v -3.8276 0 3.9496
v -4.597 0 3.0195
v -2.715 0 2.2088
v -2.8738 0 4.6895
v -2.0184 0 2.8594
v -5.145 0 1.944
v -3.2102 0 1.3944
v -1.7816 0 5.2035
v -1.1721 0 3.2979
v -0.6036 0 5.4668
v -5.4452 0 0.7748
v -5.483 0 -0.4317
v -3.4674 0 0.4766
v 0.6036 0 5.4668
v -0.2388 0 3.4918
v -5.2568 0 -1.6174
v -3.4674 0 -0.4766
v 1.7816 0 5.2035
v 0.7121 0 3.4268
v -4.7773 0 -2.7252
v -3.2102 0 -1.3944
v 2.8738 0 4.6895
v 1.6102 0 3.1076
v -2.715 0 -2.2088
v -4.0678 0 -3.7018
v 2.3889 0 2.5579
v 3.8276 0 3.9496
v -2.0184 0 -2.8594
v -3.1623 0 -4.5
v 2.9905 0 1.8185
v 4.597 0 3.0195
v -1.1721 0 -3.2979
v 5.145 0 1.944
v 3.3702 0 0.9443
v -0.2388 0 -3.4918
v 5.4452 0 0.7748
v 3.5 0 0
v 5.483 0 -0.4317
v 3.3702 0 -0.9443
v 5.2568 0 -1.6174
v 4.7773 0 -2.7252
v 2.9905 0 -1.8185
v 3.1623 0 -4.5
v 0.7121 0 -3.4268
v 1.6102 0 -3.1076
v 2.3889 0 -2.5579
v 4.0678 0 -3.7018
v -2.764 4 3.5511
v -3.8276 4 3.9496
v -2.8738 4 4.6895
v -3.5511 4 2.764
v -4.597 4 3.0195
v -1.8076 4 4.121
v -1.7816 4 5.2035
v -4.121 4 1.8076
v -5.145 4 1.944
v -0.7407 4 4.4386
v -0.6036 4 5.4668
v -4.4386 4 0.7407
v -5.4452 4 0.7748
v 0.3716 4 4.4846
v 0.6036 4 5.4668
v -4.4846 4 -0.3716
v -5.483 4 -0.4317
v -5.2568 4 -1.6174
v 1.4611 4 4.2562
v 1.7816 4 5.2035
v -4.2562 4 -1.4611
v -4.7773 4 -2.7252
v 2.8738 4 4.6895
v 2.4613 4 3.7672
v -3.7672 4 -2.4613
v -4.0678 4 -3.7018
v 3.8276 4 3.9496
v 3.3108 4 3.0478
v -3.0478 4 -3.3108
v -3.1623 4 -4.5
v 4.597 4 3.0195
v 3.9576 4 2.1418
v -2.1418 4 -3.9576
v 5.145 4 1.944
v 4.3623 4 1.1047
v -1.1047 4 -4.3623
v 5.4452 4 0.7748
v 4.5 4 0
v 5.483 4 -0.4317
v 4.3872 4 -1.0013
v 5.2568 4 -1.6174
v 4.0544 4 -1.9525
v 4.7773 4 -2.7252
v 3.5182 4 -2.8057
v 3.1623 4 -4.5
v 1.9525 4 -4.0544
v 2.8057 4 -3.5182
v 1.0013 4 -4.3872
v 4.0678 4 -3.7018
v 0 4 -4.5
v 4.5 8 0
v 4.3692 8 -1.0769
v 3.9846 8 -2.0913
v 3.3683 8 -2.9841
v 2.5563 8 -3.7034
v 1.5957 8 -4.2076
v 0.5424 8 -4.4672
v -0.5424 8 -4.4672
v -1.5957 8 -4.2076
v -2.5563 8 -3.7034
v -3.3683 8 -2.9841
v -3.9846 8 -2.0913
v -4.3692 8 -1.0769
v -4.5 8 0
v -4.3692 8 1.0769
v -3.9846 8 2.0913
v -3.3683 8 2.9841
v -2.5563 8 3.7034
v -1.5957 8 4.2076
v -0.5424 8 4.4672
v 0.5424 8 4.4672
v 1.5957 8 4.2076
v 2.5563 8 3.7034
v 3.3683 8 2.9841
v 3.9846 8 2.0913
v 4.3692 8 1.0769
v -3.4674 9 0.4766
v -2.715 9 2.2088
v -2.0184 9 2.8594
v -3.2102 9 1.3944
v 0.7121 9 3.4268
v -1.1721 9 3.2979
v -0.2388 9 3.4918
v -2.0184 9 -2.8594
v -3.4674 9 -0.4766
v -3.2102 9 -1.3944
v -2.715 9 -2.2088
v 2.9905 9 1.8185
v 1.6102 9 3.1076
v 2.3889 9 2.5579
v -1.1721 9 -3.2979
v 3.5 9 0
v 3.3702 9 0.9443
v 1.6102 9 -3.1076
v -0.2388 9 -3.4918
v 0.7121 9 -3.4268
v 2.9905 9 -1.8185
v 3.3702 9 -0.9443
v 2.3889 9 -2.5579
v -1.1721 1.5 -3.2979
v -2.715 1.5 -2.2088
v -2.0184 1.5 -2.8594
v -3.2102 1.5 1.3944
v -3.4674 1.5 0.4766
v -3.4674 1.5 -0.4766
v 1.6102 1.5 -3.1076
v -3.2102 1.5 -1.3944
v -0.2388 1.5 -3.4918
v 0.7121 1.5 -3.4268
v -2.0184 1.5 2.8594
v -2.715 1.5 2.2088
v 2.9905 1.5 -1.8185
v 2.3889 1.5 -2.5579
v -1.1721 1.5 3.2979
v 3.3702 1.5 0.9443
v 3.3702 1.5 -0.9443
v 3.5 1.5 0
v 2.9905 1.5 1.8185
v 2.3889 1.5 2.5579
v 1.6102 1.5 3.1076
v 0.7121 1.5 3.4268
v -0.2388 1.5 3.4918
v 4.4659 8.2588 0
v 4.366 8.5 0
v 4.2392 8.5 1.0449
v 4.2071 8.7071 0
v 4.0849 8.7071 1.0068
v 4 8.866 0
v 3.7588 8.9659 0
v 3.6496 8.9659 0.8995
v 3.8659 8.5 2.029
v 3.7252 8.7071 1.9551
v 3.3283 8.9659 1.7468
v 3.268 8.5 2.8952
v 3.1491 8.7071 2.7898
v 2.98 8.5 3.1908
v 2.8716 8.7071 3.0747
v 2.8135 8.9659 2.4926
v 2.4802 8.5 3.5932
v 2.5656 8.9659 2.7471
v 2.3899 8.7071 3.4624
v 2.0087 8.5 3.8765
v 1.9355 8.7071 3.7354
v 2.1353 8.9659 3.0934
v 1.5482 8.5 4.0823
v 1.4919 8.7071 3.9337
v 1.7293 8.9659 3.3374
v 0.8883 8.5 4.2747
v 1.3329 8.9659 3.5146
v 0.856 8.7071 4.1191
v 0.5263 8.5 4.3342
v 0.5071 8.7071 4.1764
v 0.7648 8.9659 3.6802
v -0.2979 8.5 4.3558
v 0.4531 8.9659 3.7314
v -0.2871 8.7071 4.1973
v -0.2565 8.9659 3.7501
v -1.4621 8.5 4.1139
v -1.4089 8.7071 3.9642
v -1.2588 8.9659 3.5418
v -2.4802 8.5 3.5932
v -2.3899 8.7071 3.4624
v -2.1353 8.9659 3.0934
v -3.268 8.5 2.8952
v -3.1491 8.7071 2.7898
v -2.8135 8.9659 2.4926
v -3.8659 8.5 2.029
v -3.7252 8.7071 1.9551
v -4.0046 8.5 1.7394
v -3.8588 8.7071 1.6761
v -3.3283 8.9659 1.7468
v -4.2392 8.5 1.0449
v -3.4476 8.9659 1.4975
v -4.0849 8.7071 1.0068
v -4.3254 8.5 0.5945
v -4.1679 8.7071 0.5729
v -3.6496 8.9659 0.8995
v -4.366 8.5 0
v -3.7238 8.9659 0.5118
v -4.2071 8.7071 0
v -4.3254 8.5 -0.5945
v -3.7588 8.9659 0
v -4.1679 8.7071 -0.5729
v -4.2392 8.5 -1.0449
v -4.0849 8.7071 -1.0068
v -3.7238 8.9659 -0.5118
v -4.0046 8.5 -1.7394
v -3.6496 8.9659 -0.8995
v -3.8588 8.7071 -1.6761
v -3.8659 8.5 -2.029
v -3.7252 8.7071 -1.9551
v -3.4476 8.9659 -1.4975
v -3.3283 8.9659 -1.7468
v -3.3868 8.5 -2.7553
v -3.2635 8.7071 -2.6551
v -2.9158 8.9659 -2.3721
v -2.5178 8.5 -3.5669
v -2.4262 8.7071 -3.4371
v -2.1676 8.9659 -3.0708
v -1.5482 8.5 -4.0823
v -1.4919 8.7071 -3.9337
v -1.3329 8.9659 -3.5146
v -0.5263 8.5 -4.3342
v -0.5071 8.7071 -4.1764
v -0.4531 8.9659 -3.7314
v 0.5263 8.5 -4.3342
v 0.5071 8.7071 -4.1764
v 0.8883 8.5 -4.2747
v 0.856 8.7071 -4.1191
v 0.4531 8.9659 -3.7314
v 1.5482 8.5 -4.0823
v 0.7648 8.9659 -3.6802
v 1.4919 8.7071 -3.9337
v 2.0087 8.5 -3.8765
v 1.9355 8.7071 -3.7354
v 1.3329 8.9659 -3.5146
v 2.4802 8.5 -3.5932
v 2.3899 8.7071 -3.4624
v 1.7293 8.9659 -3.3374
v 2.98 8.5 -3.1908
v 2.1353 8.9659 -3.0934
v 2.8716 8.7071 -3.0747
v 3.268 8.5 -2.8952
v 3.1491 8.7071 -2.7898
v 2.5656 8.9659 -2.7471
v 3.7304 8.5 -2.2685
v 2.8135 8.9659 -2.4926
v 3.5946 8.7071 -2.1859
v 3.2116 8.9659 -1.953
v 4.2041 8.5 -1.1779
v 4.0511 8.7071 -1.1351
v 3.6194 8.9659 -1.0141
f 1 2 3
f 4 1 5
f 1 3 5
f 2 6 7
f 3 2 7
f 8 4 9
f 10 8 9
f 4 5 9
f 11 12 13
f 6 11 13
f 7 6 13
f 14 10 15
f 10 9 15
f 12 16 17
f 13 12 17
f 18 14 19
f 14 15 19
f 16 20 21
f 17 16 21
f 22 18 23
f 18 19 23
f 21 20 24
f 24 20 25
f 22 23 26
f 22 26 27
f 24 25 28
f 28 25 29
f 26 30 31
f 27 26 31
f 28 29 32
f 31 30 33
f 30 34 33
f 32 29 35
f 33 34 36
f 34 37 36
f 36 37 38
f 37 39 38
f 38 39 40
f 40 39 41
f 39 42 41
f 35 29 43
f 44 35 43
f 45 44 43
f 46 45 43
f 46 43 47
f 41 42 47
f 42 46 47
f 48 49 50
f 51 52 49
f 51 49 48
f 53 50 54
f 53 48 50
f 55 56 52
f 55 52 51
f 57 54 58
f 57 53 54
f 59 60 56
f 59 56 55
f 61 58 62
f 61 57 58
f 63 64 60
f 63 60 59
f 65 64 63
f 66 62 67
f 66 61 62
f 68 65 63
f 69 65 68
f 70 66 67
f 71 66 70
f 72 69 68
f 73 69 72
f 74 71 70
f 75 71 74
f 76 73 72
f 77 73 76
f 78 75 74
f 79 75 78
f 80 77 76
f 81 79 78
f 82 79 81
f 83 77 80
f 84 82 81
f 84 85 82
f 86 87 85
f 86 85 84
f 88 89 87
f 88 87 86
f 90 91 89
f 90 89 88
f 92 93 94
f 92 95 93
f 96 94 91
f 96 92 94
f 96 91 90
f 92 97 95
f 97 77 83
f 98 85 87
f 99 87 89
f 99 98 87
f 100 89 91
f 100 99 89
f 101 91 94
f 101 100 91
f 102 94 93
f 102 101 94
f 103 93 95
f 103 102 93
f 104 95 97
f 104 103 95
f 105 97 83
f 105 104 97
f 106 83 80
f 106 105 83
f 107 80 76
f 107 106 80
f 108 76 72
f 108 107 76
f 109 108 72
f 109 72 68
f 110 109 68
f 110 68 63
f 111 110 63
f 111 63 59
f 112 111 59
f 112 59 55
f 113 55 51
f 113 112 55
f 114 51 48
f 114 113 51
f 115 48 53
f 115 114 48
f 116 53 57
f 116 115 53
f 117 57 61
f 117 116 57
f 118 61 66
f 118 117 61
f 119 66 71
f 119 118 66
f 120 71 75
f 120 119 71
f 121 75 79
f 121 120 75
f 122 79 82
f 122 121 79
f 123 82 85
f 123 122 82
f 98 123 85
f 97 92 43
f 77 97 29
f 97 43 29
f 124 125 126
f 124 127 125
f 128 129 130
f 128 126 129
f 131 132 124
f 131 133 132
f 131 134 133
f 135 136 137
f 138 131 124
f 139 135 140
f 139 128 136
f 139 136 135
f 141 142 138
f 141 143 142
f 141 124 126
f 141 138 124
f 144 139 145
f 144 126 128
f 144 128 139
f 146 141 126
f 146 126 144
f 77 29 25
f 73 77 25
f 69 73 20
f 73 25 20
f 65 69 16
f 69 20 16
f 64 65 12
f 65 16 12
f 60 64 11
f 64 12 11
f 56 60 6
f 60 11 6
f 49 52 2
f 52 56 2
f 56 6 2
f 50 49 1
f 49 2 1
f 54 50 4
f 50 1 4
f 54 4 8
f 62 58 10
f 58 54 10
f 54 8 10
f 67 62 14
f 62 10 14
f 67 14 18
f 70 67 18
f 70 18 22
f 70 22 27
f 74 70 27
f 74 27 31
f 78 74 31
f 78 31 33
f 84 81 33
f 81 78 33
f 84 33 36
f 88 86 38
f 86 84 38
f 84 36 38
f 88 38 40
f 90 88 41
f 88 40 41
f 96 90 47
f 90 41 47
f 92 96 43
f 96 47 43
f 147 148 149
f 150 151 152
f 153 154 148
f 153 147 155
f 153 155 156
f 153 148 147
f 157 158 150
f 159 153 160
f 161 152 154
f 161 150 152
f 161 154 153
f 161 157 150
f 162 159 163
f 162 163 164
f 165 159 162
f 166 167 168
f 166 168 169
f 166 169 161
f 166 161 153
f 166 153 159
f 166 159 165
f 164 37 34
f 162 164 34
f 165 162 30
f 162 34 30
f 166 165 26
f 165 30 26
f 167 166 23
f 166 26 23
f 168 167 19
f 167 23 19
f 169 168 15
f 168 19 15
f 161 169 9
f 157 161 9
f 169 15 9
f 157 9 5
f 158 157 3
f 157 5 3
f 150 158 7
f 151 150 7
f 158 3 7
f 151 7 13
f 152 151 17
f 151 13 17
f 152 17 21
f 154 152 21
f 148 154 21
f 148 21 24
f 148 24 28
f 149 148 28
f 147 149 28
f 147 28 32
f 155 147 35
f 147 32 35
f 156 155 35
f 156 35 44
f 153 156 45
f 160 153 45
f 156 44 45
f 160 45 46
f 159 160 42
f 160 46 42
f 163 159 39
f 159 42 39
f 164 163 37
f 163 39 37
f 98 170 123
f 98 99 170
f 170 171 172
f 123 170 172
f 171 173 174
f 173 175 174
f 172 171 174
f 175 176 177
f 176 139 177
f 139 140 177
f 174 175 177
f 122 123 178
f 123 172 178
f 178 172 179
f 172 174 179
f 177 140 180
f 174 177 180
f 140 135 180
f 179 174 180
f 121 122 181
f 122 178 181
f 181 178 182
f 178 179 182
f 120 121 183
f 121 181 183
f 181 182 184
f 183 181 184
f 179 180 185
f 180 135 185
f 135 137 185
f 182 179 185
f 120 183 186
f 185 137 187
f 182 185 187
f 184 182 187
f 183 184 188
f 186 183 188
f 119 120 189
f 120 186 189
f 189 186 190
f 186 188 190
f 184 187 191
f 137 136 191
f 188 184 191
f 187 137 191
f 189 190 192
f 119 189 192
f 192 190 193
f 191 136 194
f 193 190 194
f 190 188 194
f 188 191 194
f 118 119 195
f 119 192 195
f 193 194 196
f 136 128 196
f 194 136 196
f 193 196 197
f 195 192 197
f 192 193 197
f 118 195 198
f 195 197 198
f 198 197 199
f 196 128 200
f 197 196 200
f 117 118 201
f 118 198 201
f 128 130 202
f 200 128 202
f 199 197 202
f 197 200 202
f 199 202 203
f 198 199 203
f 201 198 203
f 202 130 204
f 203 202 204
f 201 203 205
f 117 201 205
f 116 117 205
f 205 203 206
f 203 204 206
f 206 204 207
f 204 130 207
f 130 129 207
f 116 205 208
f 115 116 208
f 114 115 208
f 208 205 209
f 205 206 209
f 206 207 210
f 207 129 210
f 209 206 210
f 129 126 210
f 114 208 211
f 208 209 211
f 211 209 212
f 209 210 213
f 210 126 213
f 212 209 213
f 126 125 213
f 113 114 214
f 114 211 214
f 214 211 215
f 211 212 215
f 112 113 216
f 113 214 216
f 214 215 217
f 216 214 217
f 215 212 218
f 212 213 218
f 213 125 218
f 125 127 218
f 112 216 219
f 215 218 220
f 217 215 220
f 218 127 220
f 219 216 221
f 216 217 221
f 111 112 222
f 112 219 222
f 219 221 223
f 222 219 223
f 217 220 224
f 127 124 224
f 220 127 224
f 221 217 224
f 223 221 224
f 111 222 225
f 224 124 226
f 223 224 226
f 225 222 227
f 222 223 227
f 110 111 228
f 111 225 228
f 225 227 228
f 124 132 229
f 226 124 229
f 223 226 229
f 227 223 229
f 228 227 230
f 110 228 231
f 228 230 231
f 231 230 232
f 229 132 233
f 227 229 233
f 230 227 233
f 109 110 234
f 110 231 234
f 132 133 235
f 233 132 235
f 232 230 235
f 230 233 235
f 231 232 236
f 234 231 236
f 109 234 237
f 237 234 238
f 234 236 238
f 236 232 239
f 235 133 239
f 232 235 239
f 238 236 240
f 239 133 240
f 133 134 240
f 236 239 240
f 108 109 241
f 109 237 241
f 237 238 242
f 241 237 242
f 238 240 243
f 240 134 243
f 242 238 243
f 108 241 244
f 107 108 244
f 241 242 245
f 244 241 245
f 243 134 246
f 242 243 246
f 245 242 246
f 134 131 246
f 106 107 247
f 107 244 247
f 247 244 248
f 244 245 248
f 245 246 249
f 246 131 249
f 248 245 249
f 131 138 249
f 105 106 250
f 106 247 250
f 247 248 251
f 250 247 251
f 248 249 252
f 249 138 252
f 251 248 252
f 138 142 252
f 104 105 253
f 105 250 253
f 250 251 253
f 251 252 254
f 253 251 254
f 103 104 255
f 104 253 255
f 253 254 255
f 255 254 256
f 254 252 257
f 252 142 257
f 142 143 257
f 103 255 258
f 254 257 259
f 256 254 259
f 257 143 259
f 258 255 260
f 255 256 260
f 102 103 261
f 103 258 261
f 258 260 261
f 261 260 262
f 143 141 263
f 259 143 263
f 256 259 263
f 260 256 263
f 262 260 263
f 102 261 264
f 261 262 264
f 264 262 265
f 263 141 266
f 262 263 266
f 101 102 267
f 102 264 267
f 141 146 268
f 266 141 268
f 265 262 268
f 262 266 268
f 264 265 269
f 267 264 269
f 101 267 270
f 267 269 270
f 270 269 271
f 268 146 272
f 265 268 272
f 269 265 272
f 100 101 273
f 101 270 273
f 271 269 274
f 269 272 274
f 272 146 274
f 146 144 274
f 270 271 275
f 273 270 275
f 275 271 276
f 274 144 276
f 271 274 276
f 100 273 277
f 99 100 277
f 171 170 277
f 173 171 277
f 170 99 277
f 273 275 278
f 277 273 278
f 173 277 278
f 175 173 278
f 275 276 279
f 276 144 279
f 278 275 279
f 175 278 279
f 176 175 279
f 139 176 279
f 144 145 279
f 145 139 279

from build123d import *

# Parameters (mm, degrees)
Y_KSEKLIK_EKSTR_ZYON1_DEPTH = 9
IZIM2_R                     = 3.5
KES_EKSTR_ZYON1_DEPTH       = 1.5
IZIM3_R                     = 6
IZIM3_R_2                   = 4.5
KES_EKSTR_ZYON2_DEPTH       = 5
RADYUS1_R                   = 1


with BuildPart() as part:
    # Çizim1 → Yükseklik-Ekstrüzyon1 (new body)
    with BuildSketch(Plane(origin=(0, 0, 0), x_dir=(1, 0, 0), z_dir=(0, 1, 0))):
        with BuildLine():
            Line((3.16227766, 4.5), (-3.16227766, 4.5))
            ThreePointArc((-3.16227766, 4.5), (0, -5.5), (3.16227766, 4.5))
        make_face()
    extrude(amount=Y_KSEKLIK_EKSTR_ZYON1_DEPTH)

    # Çizim2 → Kes-Ekstrüzyon1 (cut)
    with BuildSketch(Plane.XZ):
        Circle(IZIM2_R)
    extrude(amount=-KES_EKSTR_ZYON1_DEPTH, mode=Mode.SUBTRACT)

    # Çizim3 → Kes-Ekstrüzyon2 (cut)
    with BuildSketch(Plane(origin=(0, 9, 0), x_dir=(1, 0, 0), z_dir=(0, 1, 0))):
        Circle(IZIM3_R)
        Circle(IZIM3_R_2, mode=Mode.SUBTRACT)
    extrude(amount=-KES_EKSTR_ZYON2_DEPTH, mode=Mode.SUBTRACT)

    # Radyus1
    radyus1_edges = [part.edges().sort_by_distance(p)[0] for p in [
        (-4.5, 9, 0),
    ]]
    fillet(radyus1_edges, radius=RADYUS1_R)


solid = part.part
